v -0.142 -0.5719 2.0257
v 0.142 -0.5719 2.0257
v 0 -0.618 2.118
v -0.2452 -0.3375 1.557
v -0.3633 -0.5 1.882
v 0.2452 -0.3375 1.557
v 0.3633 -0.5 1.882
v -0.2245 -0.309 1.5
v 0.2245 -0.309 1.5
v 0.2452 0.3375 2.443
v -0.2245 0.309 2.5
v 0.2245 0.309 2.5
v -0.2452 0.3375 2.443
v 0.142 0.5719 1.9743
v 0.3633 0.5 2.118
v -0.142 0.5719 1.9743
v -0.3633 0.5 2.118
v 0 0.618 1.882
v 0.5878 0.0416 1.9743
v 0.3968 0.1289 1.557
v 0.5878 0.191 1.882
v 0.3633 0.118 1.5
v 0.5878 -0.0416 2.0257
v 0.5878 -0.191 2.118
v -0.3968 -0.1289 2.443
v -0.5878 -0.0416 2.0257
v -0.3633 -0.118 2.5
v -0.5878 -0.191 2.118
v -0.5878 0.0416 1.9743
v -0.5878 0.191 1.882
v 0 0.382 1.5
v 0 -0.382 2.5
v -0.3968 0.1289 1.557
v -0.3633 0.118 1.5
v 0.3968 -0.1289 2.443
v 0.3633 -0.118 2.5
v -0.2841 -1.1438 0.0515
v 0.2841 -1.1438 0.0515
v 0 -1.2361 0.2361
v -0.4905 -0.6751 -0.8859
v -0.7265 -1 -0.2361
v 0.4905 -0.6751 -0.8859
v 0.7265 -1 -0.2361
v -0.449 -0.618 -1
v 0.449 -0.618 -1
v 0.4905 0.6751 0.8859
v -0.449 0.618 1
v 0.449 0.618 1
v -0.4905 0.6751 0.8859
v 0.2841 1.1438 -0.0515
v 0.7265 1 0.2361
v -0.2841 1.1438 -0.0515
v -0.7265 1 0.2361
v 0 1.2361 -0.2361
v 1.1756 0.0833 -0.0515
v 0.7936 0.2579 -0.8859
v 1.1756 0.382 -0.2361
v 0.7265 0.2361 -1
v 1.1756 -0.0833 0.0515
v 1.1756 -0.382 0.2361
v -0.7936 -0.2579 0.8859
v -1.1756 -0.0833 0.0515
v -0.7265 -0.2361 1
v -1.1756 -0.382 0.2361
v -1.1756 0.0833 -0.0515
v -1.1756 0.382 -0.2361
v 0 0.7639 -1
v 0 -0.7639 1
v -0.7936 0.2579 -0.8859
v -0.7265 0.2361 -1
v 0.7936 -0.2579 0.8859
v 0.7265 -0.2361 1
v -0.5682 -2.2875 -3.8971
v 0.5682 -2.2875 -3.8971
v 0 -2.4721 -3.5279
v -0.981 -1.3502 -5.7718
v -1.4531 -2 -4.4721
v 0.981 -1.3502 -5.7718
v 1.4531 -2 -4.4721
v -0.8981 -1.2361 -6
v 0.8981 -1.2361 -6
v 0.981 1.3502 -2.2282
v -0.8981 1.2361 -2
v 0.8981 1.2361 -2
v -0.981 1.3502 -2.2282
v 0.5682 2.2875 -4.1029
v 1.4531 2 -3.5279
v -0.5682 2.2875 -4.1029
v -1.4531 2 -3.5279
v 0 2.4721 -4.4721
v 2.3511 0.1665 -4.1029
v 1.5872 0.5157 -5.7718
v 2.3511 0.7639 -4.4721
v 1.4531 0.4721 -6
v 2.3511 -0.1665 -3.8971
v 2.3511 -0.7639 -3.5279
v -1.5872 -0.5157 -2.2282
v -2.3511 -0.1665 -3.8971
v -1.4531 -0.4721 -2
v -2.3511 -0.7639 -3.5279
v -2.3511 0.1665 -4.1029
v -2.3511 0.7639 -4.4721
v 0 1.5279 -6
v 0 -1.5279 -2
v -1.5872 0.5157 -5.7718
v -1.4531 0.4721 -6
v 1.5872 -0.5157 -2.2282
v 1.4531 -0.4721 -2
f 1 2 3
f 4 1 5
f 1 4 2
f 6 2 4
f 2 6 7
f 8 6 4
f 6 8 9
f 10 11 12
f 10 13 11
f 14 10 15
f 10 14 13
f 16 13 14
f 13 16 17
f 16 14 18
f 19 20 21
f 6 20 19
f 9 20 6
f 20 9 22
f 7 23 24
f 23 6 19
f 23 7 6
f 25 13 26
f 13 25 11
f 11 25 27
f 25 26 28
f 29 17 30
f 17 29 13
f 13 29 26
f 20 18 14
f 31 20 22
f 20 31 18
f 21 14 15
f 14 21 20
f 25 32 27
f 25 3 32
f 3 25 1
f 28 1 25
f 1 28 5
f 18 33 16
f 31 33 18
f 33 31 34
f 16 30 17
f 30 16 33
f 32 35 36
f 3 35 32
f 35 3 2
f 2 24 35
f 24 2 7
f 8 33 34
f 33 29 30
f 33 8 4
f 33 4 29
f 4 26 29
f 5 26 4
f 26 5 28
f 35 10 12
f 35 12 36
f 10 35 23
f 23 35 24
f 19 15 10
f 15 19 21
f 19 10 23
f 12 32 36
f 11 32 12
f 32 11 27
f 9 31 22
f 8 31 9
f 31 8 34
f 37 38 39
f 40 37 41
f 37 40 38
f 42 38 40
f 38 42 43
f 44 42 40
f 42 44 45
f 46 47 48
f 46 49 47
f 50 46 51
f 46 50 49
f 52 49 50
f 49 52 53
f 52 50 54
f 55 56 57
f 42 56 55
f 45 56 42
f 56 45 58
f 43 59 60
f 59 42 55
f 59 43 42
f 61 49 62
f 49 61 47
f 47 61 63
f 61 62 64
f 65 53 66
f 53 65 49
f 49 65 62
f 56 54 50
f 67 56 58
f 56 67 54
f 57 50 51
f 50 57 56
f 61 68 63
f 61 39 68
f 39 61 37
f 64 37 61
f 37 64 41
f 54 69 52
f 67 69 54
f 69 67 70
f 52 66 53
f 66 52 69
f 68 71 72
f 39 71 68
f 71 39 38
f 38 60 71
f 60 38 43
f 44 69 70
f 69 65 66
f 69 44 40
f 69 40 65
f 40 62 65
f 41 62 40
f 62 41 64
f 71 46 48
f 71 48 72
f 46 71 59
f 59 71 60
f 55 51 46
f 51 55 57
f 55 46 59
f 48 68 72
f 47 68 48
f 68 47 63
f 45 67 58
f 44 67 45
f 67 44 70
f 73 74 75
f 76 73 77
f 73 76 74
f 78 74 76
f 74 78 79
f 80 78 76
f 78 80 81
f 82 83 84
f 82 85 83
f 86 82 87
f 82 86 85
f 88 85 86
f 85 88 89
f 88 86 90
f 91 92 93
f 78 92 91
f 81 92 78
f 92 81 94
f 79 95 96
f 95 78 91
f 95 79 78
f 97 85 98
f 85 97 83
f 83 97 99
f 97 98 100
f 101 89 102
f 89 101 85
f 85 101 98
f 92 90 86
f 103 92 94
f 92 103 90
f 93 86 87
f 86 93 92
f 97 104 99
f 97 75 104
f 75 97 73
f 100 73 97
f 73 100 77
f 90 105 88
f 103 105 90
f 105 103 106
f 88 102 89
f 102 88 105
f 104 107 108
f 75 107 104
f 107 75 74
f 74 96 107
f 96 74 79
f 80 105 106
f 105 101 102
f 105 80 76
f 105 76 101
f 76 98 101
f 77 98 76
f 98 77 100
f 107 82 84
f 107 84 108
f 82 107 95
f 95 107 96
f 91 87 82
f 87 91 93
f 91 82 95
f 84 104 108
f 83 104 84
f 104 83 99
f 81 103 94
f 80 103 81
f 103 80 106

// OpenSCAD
//create a dodecahedron by intersecting 6 boxes
module dodecahedron(height)
{
	scale([height,height,height]) //scale by height parameter
	{
		intersection(){
			//make a cube
			cube([2,2,1], center = true);
			intersection_for(i=[0:4]) //loop i from 0 to 4, and intersect results
			{
				//make a cube, rotate it 116.565 degrees around the X axis,
				//then 72*i around the Z axis
				rotate([0,0,72*i])
					rotate([116.565,0,0])
					cube([2,2,1], center = true);
			}
		}
	}
}
//create 3 stacked dodecahedra
//call the module with a height of 1 and move up 2
translate([0,0,2])dodecahedron(1);
//call the module with a height of 2
dodecahedron(2);
//call the module with a height of 4 and move down 4
translate([0,0,-4])dodecahedron(4);
